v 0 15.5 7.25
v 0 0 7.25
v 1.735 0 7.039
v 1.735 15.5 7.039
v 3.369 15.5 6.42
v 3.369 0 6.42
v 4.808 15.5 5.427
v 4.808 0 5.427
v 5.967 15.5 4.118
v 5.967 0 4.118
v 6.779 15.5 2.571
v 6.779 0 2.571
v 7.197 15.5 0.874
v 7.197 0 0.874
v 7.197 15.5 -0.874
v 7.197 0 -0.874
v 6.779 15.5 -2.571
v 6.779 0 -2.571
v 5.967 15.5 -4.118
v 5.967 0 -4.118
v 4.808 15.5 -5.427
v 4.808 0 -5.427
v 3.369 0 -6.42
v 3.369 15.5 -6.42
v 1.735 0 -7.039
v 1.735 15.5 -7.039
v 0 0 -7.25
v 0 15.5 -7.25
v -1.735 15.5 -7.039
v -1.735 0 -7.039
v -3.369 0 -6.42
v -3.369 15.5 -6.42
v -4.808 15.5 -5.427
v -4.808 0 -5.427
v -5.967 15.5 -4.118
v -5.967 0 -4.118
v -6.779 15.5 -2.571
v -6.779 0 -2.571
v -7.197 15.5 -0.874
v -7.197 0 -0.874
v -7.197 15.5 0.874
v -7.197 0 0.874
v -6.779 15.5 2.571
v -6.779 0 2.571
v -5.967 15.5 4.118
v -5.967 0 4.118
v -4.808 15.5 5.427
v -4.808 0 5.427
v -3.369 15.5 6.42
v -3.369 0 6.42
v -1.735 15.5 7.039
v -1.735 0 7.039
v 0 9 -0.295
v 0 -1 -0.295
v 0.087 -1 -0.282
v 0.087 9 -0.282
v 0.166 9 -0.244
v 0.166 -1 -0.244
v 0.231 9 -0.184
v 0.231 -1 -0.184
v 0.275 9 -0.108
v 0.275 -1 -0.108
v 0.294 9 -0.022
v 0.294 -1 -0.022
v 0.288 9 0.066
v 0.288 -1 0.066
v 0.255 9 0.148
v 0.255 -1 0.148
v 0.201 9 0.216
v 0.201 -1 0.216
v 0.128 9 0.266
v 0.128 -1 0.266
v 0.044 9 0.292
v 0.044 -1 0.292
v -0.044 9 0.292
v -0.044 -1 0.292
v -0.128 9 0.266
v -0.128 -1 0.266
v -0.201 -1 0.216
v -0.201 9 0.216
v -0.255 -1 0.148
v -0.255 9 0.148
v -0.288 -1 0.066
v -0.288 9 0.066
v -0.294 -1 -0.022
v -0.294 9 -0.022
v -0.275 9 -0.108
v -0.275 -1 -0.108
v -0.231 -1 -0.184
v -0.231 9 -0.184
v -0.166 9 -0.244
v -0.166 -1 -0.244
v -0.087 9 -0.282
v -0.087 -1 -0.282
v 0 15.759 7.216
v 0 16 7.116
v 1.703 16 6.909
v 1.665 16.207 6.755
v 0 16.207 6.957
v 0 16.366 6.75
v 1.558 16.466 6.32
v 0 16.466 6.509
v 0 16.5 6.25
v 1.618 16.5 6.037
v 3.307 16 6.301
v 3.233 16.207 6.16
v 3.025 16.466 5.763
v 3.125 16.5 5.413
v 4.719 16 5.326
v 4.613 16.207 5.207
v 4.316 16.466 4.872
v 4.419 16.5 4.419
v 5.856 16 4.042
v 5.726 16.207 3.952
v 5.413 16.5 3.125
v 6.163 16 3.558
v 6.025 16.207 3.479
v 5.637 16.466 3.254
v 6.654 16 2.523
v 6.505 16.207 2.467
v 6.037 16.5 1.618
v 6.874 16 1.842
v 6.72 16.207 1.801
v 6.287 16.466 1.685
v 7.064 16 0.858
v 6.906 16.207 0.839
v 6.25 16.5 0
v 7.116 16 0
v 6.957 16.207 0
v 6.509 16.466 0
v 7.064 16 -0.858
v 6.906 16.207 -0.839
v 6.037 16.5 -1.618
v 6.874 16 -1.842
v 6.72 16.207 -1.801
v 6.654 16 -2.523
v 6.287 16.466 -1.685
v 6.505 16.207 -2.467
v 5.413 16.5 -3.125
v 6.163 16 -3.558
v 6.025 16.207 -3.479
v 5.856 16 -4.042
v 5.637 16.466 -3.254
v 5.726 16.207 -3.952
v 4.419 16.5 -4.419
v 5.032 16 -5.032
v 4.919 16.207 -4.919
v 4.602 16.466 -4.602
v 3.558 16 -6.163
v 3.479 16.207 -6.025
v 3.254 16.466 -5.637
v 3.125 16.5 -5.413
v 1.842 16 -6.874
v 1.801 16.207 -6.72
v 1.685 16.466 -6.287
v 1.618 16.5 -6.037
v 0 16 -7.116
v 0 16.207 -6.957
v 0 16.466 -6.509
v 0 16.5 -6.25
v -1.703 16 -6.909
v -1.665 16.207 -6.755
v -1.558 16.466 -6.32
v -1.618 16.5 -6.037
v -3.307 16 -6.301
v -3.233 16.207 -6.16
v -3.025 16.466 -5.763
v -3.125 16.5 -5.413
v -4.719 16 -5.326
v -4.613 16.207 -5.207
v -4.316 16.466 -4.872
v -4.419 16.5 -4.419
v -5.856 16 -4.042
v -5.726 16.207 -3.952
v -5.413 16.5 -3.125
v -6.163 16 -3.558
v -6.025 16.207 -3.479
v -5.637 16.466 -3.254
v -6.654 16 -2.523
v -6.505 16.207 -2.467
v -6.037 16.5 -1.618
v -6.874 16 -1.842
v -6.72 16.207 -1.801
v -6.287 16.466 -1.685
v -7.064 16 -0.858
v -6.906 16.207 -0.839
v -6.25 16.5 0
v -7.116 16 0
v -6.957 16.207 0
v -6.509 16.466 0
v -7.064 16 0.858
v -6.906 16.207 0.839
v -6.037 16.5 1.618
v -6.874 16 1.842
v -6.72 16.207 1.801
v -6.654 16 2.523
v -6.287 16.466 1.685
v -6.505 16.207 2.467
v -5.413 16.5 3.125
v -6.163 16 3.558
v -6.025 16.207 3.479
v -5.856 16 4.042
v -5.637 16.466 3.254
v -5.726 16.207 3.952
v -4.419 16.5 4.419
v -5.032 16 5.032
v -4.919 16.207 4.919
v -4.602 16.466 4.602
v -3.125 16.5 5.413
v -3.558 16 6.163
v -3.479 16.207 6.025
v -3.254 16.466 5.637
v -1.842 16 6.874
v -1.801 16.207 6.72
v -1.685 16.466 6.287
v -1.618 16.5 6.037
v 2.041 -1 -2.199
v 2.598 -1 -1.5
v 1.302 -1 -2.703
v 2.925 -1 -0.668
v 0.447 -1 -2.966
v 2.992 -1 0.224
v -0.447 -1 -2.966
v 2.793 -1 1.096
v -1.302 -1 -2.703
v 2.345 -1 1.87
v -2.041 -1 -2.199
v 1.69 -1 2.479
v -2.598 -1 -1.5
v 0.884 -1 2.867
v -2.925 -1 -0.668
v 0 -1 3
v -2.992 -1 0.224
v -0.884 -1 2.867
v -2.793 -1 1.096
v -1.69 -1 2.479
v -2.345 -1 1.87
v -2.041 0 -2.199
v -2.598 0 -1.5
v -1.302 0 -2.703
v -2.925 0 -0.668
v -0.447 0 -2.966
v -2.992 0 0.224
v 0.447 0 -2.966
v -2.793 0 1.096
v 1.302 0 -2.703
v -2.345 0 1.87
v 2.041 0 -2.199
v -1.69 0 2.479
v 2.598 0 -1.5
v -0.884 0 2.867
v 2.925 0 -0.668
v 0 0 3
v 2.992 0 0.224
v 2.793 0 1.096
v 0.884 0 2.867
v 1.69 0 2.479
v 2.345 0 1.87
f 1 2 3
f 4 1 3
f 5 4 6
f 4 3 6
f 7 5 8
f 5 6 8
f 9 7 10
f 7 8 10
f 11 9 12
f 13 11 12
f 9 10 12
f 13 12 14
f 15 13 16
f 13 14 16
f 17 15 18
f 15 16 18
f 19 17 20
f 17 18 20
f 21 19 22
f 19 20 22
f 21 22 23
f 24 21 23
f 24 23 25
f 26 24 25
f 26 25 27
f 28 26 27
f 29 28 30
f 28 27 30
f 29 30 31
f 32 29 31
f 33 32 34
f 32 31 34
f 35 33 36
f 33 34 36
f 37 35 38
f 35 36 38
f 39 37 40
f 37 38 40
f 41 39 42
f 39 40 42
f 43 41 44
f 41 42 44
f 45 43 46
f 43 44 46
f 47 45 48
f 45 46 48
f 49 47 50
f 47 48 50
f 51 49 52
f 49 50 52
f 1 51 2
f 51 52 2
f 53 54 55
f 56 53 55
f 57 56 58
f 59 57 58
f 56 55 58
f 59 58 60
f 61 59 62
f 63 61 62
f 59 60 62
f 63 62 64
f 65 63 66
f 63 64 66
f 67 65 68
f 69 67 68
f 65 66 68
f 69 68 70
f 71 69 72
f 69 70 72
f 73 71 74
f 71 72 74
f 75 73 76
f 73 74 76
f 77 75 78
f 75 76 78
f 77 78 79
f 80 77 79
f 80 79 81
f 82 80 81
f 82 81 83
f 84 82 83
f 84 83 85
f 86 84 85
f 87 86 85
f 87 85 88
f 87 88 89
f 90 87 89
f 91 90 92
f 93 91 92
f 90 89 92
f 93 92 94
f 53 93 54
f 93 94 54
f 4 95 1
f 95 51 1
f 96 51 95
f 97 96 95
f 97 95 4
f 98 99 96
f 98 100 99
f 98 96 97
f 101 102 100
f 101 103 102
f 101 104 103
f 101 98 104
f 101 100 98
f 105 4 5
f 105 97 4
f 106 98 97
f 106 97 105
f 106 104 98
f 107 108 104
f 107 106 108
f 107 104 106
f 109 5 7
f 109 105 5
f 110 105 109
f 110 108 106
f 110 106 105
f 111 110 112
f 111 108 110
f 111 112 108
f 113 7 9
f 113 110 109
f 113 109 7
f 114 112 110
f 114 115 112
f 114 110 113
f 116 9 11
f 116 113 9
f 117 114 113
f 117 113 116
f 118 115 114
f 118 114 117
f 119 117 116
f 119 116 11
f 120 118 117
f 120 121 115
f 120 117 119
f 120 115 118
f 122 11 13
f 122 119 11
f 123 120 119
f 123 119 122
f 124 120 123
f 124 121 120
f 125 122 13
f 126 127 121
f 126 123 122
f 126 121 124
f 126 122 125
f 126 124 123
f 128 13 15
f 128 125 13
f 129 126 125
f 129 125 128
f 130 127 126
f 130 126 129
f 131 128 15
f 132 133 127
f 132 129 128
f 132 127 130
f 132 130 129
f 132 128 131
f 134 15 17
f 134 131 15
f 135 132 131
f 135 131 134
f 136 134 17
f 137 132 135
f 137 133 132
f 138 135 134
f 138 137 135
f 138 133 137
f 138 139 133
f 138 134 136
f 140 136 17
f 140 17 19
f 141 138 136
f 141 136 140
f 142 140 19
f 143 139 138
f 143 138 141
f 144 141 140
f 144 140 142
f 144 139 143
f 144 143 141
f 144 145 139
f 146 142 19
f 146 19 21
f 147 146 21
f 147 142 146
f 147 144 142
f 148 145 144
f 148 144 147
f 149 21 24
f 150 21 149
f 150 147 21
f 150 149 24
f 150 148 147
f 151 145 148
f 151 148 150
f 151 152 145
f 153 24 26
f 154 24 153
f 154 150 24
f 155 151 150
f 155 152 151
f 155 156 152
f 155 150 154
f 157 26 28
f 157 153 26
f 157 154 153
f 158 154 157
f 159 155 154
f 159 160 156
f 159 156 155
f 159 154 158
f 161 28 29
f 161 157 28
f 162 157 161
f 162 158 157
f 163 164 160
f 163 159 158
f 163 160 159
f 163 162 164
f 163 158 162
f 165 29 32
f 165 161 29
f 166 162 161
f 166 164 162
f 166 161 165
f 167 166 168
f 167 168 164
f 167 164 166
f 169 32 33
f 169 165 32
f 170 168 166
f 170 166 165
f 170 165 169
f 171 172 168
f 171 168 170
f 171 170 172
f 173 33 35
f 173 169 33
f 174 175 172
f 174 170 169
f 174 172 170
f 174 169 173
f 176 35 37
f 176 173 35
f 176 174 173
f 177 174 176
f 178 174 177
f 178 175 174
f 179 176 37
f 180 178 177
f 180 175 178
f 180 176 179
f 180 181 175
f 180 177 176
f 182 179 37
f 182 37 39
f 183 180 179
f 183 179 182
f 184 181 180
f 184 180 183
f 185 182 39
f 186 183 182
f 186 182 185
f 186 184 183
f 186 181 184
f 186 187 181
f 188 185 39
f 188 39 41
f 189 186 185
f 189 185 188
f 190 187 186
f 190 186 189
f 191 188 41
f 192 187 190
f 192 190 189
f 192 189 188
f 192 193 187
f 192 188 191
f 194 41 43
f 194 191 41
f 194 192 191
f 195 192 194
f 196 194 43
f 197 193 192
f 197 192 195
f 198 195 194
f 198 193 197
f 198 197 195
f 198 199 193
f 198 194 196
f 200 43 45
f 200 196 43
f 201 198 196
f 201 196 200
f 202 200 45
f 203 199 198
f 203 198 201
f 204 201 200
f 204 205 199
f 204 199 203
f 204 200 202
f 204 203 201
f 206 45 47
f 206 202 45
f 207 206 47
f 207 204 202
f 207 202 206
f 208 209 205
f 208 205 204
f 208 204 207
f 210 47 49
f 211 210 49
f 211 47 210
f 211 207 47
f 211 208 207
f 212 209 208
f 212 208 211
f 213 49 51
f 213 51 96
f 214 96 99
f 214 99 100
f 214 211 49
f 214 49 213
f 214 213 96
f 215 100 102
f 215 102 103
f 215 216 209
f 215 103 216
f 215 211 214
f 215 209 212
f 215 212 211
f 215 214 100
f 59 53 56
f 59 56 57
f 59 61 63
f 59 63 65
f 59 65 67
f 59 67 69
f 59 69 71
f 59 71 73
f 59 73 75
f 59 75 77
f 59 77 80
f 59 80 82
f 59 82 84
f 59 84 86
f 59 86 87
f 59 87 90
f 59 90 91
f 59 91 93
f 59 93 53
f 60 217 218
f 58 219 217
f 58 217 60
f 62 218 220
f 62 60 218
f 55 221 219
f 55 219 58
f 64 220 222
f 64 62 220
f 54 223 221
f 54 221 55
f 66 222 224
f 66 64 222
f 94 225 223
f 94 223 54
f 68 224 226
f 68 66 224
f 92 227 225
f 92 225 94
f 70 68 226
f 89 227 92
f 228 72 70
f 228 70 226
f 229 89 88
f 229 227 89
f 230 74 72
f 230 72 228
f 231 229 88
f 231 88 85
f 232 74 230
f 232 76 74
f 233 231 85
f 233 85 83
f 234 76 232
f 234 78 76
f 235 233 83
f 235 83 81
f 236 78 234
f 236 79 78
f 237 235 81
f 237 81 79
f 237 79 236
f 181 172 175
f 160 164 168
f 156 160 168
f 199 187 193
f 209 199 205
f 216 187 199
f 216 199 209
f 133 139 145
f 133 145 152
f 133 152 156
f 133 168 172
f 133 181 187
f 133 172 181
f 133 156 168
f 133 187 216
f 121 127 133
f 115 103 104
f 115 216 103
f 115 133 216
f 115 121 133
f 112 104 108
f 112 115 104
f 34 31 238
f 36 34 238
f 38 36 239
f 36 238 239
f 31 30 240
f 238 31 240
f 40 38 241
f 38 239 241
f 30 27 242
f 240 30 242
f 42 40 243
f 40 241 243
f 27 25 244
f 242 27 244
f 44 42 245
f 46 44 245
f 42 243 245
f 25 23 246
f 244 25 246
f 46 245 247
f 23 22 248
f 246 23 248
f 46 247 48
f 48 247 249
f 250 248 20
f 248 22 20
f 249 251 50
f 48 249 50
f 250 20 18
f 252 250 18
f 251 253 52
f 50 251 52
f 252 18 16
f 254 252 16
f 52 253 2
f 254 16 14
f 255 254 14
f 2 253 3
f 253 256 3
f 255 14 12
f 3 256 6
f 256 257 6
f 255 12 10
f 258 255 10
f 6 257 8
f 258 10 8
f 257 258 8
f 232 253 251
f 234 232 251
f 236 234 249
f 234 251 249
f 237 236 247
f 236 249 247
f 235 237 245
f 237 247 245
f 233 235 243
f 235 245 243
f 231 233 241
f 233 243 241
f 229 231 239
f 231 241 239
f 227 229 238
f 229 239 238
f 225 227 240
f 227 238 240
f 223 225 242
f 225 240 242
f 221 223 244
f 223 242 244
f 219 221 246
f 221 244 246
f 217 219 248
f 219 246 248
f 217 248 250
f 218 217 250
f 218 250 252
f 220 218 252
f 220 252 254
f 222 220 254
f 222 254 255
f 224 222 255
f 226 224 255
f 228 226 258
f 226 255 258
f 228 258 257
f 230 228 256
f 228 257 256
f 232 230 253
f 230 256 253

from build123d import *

# Parameters (mm, degrees)
SKETCH1_R           = 7.25
BOSS_EXTRUDE1_DEPTH = 16.5
FILLET1_R           = 1
SKETCH4_R           = 3
BOSS_EXTRUDE2_DEPTH = 1
SKETCH5_R           = 0.295
CUT_EXTRUDE2_DEPTH  = 10


with BuildPart() as part:
    # Sketch1 → Boss-Extrude1 (new body)
    with BuildSketch(Plane(origin=(0, 0, 0), x_dir=(1, 0, 0), z_dir=(0, 1, 0))):
        with Locations(Location((0, 0, 0), (0, 0, 270))):
            Circle(SKETCH1_R)
    extrude(amount=BOSS_EXTRUDE1_DEPTH)

    # Fillet1
    fillet1_edges = [part.edges().sort_by_distance(p)[0] for p in [
        (0, 16.5, -7.25),
    ]]
    fillet(fillet1_edges, radius=FILLET1_R)

    # Sketch4 → Boss-Extrude2 (add)
    with BuildSketch(Plane.XZ):
        with Locations(Location((0, 0, 0), (0, 0, 90))):
            Circle(SKETCH4_R)
    extrude(amount=BOSS_EXTRUDE2_DEPTH)

    # Sketch5 → Cut-Extrude2 (cut)
    with BuildSketch(Plane.XZ.offset(1)):
        with Locations(Location((0, 0, 0), (0, 0, 270))):
            Circle(SKETCH5_R)
    extrude(amount=-CUT_EXTRUDE2_DEPTH, mode=Mode.SUBTRACT)


solid = part.part
